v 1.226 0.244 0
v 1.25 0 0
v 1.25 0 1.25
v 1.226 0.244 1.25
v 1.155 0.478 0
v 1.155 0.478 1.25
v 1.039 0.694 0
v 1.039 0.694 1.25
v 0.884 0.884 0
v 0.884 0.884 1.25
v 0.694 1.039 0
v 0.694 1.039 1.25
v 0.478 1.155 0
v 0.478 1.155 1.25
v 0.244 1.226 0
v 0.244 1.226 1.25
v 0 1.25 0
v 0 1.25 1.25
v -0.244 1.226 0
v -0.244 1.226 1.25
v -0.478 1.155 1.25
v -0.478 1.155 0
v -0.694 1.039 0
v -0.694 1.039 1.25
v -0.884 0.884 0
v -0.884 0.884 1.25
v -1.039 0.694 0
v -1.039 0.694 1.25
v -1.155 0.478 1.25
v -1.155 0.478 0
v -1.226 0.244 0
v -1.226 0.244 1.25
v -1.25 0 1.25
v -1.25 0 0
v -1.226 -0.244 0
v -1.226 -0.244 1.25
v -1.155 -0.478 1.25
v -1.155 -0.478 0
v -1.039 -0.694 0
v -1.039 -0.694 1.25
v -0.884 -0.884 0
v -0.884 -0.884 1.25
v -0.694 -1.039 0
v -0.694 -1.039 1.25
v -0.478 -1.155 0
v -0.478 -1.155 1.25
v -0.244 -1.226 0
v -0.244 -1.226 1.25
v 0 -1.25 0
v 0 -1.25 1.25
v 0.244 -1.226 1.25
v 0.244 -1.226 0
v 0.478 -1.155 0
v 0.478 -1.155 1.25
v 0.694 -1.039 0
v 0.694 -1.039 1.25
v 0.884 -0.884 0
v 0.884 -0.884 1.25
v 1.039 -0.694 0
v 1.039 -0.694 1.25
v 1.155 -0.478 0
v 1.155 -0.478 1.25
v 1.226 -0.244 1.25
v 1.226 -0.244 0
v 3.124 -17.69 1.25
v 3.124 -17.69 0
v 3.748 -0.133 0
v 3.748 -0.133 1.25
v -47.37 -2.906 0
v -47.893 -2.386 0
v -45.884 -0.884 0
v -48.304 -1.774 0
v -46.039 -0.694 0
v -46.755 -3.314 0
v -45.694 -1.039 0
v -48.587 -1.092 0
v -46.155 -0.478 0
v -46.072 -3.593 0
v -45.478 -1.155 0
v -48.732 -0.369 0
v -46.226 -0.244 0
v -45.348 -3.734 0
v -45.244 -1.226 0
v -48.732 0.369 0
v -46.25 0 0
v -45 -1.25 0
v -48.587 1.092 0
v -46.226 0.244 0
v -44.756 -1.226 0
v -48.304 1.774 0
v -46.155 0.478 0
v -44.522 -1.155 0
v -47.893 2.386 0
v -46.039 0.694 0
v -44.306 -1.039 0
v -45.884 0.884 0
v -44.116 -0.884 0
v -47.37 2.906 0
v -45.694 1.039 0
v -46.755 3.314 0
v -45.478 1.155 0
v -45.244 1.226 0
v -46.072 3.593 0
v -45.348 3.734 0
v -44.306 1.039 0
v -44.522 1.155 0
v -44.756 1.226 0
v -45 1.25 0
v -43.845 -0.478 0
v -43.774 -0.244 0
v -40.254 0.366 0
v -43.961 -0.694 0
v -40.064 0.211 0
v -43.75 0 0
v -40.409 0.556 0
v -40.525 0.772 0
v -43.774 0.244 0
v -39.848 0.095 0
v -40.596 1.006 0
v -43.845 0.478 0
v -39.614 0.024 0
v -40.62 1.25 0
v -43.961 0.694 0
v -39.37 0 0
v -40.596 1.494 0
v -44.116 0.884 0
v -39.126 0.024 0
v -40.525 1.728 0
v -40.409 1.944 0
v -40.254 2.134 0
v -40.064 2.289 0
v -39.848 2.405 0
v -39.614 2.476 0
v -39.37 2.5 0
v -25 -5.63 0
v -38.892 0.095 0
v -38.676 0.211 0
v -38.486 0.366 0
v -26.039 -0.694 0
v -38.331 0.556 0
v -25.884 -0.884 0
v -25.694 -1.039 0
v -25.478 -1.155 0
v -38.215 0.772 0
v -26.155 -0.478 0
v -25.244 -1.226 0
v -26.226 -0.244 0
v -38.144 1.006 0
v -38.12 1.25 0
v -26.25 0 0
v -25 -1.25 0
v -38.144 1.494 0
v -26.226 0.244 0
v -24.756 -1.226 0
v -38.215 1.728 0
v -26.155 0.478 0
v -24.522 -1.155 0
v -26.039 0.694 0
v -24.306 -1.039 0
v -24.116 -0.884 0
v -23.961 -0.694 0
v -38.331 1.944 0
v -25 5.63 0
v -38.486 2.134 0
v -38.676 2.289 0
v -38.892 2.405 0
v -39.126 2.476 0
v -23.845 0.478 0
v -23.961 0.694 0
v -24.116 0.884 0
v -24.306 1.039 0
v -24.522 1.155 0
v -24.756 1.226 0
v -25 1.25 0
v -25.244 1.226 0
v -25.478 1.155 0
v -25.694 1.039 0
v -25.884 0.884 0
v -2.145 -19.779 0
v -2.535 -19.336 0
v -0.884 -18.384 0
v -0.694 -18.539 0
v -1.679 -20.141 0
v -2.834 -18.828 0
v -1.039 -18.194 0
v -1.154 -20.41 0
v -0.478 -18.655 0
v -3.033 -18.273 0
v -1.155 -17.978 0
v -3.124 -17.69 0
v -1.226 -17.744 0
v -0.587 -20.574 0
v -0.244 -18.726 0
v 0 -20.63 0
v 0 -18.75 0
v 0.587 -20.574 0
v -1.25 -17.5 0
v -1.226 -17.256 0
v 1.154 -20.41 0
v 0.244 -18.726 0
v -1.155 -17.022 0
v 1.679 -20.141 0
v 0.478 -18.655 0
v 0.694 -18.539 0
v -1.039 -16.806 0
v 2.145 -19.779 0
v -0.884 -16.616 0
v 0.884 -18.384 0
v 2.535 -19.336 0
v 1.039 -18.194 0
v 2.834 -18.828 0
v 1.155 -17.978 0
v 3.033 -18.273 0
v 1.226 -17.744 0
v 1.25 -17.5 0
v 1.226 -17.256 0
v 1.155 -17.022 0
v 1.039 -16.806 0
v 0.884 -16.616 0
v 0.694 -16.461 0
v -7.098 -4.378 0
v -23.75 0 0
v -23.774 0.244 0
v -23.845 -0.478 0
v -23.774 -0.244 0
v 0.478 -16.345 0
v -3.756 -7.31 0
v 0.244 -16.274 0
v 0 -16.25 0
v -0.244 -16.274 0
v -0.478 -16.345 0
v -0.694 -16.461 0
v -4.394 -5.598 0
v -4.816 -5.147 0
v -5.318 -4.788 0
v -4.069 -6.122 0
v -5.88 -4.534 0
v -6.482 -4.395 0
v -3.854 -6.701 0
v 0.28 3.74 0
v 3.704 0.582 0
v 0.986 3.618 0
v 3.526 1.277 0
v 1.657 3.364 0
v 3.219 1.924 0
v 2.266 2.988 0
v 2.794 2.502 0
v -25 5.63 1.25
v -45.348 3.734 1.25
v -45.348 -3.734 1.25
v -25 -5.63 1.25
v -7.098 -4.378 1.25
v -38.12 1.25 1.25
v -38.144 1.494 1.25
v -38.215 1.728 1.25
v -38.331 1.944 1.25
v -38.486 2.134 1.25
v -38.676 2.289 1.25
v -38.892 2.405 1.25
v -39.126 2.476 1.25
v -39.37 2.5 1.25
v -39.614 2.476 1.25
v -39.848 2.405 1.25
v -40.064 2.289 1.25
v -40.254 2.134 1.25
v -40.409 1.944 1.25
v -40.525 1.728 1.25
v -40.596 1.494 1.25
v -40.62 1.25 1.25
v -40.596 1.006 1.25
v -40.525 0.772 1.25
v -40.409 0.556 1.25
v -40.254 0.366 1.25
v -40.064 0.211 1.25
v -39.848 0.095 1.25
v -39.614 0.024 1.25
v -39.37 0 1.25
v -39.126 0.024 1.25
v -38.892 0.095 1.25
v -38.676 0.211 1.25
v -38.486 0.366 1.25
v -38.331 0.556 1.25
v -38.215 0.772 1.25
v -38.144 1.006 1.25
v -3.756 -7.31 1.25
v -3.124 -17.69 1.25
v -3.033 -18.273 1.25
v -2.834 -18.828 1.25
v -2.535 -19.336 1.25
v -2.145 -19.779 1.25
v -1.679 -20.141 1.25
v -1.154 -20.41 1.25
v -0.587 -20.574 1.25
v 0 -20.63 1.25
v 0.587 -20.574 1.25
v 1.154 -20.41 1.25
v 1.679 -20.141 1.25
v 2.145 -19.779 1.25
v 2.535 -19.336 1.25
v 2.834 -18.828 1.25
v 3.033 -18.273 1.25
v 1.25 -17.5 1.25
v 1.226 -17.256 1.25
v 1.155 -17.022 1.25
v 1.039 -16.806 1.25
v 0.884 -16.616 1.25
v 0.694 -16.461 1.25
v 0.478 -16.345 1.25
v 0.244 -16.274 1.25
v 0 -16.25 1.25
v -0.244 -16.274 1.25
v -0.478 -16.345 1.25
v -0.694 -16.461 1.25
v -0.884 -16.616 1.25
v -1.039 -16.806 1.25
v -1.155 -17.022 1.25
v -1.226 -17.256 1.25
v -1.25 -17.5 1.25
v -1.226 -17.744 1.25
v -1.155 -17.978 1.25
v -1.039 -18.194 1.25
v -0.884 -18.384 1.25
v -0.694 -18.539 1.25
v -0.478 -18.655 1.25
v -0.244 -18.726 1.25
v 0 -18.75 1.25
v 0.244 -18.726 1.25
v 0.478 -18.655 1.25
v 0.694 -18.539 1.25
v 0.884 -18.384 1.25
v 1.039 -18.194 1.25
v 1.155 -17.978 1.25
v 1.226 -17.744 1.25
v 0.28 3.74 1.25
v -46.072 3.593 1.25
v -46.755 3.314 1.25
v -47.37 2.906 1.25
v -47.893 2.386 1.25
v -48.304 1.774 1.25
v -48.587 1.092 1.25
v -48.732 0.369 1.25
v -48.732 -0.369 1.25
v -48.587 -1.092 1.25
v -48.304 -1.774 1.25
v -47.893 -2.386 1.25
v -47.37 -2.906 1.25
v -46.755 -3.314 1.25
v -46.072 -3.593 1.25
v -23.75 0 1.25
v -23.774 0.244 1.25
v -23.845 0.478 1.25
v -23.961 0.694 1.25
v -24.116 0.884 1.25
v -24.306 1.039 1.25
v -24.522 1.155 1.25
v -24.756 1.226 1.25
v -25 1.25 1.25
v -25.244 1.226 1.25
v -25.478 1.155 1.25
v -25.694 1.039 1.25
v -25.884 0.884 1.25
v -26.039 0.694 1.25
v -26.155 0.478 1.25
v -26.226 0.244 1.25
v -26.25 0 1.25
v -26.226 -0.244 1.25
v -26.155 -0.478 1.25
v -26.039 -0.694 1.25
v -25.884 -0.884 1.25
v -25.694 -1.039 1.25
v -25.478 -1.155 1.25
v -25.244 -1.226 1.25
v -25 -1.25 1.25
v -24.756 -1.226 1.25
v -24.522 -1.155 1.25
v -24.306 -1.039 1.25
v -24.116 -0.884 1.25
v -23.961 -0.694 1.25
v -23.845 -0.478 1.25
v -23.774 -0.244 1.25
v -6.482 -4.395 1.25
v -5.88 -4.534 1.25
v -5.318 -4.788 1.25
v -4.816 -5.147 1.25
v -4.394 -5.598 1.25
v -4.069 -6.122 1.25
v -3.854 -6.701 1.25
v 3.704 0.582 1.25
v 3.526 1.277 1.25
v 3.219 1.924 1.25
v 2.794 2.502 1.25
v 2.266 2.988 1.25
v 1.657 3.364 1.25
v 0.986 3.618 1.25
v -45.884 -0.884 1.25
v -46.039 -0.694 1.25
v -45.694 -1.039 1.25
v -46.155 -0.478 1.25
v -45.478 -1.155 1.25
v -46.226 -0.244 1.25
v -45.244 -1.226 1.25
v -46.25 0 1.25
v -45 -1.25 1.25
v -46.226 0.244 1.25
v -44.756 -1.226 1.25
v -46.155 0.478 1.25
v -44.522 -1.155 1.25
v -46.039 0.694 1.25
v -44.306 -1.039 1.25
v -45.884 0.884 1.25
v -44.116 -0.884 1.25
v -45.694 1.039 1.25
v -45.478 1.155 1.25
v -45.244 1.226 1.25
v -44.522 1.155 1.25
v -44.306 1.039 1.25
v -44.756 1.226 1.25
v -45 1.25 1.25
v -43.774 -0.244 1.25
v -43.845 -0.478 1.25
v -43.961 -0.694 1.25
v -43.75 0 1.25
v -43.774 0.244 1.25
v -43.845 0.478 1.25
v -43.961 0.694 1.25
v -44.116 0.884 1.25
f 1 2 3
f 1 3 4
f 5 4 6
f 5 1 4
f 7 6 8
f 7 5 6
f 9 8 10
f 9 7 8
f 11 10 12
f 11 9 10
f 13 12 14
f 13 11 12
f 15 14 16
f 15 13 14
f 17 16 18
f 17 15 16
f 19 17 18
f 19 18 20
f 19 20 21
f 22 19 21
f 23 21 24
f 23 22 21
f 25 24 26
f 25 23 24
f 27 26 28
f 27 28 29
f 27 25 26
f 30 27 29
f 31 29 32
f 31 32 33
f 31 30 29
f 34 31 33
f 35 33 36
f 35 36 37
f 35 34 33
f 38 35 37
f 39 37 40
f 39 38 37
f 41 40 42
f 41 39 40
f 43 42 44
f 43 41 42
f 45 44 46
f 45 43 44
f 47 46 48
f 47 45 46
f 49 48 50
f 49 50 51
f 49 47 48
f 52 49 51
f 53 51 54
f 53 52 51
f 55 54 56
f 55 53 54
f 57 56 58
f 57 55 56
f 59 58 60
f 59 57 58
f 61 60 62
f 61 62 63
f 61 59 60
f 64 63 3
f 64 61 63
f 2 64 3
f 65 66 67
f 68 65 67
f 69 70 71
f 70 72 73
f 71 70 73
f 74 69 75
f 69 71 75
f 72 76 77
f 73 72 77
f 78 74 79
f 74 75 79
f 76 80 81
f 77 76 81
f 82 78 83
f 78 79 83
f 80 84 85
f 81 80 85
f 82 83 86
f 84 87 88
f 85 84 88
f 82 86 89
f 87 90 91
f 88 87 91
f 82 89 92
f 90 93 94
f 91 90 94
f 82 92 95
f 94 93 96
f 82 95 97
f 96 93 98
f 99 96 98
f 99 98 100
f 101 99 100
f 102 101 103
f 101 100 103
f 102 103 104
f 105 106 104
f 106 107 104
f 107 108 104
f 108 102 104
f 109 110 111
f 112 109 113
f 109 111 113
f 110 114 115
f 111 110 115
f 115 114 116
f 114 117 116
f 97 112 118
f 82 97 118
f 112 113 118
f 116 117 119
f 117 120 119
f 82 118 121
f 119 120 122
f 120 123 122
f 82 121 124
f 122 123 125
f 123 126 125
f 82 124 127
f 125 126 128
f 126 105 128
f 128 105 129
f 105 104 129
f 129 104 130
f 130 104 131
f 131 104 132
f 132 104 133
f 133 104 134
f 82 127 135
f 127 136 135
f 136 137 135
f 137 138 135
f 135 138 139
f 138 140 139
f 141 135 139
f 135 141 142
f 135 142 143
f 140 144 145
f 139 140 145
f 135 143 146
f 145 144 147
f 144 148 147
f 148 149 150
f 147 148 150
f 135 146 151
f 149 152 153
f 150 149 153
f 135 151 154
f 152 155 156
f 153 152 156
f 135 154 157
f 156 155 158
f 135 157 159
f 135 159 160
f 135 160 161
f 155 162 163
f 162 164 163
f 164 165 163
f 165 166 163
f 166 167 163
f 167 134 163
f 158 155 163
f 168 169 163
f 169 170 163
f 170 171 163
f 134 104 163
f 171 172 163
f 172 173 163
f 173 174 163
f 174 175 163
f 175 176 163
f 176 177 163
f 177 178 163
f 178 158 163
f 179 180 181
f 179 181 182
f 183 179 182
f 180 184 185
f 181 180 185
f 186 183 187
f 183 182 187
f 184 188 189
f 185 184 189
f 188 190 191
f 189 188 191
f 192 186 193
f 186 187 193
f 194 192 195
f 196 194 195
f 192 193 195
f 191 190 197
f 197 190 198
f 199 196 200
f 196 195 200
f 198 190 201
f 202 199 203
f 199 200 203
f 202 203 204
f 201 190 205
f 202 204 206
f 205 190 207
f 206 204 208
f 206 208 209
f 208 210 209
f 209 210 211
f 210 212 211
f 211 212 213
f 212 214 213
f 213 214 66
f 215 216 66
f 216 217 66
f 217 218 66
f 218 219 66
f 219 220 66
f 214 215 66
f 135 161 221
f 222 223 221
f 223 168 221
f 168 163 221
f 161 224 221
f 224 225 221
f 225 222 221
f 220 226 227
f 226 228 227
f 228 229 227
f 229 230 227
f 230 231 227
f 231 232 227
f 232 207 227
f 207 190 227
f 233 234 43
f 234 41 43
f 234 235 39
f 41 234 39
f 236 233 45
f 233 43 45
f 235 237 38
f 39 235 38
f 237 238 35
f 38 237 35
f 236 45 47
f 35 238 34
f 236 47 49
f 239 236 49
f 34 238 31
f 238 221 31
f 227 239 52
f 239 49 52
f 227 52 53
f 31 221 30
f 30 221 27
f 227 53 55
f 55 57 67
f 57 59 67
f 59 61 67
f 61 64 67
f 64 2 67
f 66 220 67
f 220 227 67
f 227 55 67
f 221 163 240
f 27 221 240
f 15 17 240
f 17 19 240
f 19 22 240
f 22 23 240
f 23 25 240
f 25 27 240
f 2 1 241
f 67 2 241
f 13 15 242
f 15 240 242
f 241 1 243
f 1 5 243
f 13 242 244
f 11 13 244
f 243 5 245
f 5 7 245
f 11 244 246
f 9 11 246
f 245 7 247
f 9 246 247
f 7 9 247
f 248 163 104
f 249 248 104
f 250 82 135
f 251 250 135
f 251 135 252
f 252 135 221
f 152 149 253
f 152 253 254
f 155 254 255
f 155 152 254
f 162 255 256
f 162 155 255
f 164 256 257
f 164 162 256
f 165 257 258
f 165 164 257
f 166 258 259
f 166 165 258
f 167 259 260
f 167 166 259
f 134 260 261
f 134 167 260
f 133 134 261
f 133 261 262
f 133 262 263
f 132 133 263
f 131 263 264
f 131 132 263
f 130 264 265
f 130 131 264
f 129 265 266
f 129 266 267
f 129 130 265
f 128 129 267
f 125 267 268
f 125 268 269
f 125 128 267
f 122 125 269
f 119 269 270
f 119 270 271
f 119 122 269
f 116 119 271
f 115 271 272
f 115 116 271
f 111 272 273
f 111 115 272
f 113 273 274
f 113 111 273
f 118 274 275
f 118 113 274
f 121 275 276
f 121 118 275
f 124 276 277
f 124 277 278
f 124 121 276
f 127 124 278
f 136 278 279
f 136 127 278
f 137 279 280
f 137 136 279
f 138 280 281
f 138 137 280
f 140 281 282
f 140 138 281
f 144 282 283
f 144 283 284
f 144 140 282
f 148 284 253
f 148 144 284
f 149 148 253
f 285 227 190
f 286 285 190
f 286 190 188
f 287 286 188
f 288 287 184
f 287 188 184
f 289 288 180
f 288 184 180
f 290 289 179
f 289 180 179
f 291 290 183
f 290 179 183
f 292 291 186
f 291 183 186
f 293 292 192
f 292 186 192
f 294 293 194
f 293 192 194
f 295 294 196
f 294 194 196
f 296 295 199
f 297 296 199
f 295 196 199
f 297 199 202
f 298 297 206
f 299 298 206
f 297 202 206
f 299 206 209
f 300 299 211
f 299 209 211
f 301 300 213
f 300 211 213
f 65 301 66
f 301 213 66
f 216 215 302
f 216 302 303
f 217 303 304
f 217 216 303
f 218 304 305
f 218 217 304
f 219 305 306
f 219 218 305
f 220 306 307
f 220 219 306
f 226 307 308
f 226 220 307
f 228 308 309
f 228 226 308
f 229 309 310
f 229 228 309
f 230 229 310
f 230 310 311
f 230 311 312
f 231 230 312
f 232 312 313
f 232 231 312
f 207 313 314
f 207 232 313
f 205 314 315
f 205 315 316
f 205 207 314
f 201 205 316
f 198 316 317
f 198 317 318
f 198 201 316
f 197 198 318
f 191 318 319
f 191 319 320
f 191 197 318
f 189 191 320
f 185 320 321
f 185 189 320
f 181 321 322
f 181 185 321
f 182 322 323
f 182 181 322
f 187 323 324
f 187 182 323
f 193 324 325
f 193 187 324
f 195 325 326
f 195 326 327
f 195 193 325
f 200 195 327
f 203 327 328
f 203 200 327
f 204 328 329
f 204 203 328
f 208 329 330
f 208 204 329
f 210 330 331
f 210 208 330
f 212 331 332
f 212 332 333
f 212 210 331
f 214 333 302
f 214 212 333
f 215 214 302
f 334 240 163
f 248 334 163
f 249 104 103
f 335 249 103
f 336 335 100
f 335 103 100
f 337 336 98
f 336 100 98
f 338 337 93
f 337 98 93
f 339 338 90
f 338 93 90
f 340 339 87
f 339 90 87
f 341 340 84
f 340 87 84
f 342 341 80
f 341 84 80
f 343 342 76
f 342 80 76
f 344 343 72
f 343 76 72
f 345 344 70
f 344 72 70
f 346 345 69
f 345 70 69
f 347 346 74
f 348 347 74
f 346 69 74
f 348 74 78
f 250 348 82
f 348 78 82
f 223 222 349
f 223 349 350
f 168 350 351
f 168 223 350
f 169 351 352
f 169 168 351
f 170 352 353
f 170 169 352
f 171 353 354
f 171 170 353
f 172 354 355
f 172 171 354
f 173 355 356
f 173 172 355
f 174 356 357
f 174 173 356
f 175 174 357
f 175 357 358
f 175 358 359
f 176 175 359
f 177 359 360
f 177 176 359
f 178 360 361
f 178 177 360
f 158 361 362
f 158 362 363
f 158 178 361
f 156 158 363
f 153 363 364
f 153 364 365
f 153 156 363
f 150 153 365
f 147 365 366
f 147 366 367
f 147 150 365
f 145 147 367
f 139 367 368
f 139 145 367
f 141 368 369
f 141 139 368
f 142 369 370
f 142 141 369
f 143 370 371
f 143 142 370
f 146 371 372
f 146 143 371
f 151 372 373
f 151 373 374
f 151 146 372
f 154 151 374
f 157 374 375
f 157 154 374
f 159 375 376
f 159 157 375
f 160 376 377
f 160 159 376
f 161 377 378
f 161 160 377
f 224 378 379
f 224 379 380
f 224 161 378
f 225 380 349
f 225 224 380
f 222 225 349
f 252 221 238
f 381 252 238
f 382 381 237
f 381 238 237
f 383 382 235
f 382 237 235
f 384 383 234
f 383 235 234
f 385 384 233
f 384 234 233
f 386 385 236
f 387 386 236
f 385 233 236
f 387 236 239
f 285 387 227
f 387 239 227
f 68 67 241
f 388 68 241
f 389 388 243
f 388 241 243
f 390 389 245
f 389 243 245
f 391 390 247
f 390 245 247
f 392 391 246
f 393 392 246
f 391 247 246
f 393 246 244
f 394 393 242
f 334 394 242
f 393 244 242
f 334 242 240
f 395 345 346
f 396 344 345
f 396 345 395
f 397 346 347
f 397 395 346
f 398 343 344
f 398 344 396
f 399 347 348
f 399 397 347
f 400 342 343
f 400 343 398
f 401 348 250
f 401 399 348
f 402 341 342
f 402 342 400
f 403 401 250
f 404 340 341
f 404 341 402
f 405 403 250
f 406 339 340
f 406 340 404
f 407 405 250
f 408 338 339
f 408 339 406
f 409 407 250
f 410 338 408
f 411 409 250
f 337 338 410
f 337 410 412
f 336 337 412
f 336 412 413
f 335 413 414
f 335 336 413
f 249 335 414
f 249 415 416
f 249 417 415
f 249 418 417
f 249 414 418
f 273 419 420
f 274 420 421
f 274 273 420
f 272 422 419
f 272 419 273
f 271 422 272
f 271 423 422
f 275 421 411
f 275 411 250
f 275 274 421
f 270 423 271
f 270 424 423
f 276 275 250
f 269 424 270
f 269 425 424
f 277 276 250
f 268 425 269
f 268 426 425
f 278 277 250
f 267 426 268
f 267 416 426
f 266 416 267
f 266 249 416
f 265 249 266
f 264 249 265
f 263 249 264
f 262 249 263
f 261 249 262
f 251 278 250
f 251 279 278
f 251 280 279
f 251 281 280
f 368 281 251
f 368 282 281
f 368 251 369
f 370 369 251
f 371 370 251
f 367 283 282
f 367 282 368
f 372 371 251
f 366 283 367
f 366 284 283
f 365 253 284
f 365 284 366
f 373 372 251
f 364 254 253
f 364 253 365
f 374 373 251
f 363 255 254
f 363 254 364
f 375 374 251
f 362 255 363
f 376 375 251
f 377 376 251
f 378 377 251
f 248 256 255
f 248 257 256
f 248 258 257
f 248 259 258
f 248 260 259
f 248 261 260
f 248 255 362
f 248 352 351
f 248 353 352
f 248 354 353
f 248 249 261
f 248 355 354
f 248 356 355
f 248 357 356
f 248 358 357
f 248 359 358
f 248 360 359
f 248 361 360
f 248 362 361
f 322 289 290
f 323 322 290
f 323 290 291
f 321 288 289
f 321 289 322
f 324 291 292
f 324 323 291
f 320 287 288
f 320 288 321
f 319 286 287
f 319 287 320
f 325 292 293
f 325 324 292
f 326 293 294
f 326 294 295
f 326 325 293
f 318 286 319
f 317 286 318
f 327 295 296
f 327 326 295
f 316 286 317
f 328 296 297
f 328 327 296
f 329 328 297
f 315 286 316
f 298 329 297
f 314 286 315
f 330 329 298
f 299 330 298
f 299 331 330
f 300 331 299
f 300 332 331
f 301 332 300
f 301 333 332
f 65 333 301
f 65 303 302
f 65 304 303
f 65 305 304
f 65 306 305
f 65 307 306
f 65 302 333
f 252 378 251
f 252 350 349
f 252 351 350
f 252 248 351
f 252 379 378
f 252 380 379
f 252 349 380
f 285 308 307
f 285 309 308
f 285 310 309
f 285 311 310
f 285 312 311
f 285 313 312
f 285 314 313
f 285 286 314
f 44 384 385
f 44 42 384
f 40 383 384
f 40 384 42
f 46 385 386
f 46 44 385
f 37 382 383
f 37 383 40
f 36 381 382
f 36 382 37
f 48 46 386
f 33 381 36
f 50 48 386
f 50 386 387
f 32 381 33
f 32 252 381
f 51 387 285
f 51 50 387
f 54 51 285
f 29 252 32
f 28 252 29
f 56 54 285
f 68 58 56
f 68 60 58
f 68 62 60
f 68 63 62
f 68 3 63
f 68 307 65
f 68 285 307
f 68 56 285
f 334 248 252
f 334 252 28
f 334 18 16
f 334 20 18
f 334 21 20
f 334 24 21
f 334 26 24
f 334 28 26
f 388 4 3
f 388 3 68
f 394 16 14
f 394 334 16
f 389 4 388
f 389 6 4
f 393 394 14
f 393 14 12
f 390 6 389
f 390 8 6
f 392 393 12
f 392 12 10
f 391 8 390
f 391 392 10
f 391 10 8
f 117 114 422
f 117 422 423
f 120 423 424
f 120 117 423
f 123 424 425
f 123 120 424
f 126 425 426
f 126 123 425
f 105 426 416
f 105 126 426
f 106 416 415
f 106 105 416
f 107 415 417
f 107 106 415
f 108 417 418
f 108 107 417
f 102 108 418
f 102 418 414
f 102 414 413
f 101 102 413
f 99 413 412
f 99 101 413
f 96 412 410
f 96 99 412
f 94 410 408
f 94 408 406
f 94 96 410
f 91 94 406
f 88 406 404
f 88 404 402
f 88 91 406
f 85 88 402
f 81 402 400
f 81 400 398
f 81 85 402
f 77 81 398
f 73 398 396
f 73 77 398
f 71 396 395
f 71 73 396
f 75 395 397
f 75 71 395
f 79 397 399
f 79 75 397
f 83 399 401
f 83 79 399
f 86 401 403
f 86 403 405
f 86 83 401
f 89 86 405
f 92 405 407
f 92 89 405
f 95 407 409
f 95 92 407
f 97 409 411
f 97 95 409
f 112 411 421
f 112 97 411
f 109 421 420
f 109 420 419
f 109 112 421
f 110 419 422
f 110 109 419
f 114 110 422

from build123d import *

# Parameters (mm, degrees)
SKETCH2_R           = 1.25
BOSS_EXTRUDE1_DEPTH = 1.25


with BuildPart() as part:
    # Sketch2 → Boss-Extrude1 (new body)
    with BuildSketch(Plane.XY):
        with BuildLine():
            Line((0.279648542, 3.739558355), (-25, 5.63))
            Line((-25, 5.63), (-45.347946147, 3.733822904))
            ThreePointArc((-45.347946147, 3.733822904), (-48.75, 0), (-45.347946147, -3.733822904))
            Line((-45.347946147, -3.733822904), (-25, -5.63))
            Line((-25, -5.63), (-7.098436577, -4.377631434))
            ThreePointArc((-7.098436577, -4.377631434), (-4.815909482, -5.147037966), (-3.75577728, -7.309914769))
            Line((-3.75577728, -7.309914769), (-3.12422272, -17.690085231))
            ThreePointArc((-3.12422272, -17.690085231), (0, -20.63), (3.12422272, -17.690085231))
            Line((3.12422272, -17.690085231), (3.747638192, -0.133071355))
            ThreePointArc((3.747638192, -0.133071355), (2.793577424, 2.501684467), (0.279648542, 3.739558355))
        make_face()
        Circle(SKETCH2_R, mode=Mode.SUBTRACT)
        with Locations((0, -17.5)):
            Circle(SKETCH2_R, mode=Mode.SUBTRACT)
        with Locations((-45, 0)):
            Circle(SKETCH2_R, mode=Mode.SUBTRACT)
        with Locations((-25, 0)):
            Circle(SKETCH2_R, mode=Mode.SUBTRACT)
        with Locations((-39.37, 1.25)):
            Circle(SKETCH2_R, mode=Mode.SUBTRACT)
    extrude(amount=BOSS_EXTRUDE1_DEPTH)


solid = part.part
